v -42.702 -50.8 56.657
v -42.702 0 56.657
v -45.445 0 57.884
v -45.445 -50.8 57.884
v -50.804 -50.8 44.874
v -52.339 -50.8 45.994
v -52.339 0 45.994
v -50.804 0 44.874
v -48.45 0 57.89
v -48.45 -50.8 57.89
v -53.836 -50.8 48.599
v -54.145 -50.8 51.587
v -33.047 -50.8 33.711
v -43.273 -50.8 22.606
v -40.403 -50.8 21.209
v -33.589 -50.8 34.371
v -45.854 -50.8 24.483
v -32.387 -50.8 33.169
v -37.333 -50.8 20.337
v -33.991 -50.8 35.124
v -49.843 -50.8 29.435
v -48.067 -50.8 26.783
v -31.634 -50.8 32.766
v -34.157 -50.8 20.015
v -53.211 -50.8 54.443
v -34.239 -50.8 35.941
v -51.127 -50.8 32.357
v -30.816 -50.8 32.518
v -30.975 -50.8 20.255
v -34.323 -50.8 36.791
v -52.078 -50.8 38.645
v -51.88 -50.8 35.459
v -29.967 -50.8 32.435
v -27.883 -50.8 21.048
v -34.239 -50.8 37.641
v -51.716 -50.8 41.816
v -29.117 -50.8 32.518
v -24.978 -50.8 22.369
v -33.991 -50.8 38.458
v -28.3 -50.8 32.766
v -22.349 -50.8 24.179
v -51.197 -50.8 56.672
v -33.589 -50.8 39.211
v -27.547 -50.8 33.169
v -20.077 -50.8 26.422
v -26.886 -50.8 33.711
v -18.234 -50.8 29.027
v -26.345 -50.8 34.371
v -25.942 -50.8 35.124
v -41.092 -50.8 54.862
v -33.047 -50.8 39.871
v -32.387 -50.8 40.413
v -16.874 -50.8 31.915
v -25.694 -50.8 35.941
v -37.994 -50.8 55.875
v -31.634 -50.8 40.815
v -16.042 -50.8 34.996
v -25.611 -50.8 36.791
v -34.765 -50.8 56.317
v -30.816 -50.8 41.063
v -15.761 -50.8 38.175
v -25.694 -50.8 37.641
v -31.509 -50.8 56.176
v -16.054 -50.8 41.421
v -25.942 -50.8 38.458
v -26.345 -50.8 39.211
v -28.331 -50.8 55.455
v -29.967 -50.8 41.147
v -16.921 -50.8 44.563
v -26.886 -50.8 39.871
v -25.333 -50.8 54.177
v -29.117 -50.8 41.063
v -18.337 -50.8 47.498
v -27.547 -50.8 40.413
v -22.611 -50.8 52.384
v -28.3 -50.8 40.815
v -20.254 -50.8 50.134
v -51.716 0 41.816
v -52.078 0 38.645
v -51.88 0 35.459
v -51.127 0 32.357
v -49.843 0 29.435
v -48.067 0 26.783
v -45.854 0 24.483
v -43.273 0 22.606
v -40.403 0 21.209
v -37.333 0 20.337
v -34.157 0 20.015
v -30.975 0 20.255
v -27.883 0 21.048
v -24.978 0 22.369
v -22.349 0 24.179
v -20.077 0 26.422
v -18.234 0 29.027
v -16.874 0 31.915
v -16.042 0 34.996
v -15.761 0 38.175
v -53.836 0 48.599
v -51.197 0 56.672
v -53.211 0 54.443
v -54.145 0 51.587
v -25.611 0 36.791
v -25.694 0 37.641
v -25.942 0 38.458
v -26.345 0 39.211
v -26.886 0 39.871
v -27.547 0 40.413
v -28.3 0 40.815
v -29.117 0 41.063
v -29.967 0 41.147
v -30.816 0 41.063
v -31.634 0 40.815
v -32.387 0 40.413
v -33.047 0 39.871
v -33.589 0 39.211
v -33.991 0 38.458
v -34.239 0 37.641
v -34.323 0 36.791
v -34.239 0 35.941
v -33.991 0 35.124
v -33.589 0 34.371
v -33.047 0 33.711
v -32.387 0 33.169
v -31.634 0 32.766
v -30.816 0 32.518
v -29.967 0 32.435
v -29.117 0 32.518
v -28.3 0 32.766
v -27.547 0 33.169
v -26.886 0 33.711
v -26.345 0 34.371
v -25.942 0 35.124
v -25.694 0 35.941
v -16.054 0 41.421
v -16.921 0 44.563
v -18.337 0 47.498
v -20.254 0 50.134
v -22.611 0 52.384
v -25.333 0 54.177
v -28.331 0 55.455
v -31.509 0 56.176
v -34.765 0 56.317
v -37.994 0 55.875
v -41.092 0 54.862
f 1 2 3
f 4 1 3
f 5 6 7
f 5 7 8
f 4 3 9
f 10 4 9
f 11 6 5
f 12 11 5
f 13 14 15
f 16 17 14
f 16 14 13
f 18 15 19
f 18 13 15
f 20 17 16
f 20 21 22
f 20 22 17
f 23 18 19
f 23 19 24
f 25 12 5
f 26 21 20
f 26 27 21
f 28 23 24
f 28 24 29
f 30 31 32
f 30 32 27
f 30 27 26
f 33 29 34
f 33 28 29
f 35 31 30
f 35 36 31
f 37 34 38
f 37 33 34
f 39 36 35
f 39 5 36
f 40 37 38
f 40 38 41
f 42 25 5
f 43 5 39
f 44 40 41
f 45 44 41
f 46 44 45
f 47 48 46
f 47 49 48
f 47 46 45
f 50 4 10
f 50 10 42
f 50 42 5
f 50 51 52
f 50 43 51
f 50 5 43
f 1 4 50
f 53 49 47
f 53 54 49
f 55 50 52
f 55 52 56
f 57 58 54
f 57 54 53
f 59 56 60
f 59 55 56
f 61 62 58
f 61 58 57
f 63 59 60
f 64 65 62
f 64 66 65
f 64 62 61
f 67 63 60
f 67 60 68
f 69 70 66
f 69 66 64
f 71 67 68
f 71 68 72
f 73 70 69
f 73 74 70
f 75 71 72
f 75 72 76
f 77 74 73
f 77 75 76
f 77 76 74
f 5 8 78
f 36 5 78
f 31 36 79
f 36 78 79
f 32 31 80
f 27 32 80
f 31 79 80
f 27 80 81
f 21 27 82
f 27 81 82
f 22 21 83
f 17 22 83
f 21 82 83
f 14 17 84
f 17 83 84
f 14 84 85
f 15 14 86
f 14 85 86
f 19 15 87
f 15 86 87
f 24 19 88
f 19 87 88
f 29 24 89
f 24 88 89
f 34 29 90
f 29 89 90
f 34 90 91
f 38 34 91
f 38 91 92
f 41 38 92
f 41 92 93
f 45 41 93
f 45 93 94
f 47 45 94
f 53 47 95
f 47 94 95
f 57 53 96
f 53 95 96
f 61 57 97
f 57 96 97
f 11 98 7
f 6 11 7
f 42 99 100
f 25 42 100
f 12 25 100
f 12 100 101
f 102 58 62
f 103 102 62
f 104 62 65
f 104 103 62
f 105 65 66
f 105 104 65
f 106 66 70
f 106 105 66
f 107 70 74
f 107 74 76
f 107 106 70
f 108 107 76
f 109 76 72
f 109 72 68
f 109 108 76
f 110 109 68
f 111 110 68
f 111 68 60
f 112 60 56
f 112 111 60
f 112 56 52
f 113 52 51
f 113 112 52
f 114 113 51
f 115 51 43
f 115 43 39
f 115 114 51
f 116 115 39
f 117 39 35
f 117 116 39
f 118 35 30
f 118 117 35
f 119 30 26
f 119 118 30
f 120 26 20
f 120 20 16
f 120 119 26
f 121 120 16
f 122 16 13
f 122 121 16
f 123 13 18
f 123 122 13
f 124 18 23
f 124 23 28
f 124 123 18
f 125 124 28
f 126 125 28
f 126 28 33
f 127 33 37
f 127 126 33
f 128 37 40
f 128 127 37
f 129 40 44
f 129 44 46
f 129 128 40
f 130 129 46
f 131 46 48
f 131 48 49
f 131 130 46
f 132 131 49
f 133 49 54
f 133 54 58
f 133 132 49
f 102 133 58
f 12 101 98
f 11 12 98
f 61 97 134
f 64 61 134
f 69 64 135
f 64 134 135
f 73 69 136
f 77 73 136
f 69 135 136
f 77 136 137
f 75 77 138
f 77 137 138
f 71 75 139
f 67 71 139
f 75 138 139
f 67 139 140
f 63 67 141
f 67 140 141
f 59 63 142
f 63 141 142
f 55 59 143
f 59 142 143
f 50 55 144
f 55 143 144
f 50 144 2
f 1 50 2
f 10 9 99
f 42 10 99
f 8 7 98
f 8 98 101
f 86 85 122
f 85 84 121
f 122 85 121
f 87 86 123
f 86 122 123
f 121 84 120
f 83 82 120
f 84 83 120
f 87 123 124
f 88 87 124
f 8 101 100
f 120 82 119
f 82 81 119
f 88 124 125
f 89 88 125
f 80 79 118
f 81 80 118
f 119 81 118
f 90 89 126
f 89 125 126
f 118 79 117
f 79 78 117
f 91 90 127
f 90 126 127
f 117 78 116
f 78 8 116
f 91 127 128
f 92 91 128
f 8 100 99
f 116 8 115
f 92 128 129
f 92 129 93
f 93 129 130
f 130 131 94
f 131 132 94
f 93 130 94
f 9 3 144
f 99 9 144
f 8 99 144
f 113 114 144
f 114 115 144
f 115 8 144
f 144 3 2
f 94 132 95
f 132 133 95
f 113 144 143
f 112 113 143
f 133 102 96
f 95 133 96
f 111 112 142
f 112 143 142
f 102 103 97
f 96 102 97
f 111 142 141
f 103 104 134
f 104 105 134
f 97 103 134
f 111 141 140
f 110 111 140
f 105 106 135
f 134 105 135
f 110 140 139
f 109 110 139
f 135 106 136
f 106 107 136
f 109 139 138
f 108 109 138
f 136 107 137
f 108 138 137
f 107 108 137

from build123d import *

# Parameters (mm, degrees)
F0_R     = 4.3560889736
F1_DEPTH = 50.8


with BuildPart() as f1:
    # F0 (on Front) → F1 (new body)
    with BuildSketch(Plane.XZ):
        with BuildLine():
            ThreePointArc((-50.8035481042, 44.8743139746), (-37.3327925125, 20.3368670349), (-15.7611440911, 38.1753519177))
            ThreePointArc((-15.7611440911, 38.1753519177), (-23.931762198, 53.3418471705), (-41.0919163358, 54.8619420575))
            Line((-41.0919163358, 54.8619420575), (-40.6960048204, 54.4206382187))
            Line((-40.6960048204, 54.4206382187), (-39.7726875247, 51.561406541))
            Line((-39.7726875247, 51.561406541), (-40.0921494975, 48.5738214521))
            Line((-40.0921494975, 48.5738214521), (-41.5991528616, 45.9744635553))
            Line((-41.5991528616, 45.9744635553), (-44.0331230447, 44.2127854453))
            Line((-44.0331230447, 44.2127854453), (-46.97320449, 43.5933972717))
            Line((-46.97320449, 43.5933972717), (-49.9110304061, 44.2233968767))
            Line((-49.9110304061, 44.2233968767), (-50.8035481042, 44.8743139746))
        make_face()
        with Locations((-29.9666635692, 36.7907546461)):
            Circle(F0_R, mode=Mode.SUBTRACT)
        with BuildLine():
            Line((-40.6960048204, 54.4206382187), (-41.0919163358, 54.8619420575))
            ThreePointArc((-41.0919163358, 54.8619420575), (-46.9434332236, 50.8363139975), (-50.8035481042, 44.8743139746))
            Line((-50.8035481042, 44.8743139746), (-49.9110304061, 44.2233968767))
            Line((-49.9110304061, 44.2233968767), (-46.97320449, 43.5933972717))
            Line((-46.97320449, 43.5933972717), (-44.0331230447, 44.2127854453))
            Line((-44.0331230447, 44.2127854453), (-41.5991528616, 45.9744635553))
            Line((-41.5991528616, 45.9744635553), (-40.0921494975, 48.5738214521))
            Line((-40.0921494975, 48.5738214521), (-39.7726875247, 51.561406541))
            Line((-39.7726875247, 51.561406541), (-40.6960048204, 54.4206382187))
        make_face()
        with BuildLine():
            ThreePointArc((-50.8035481042, 44.8743139746), (-46.9434332236, 50.8363139975), (-41.0919163358, 54.8619420575))
            Line((-41.0919163358, 54.8619420575), (-42.7024514363, 56.6571293527))
            Line((-42.7024514363, 56.6571293527), (-45.4450945244, 57.8841703083))
            Line((-45.4450945244, 57.8841703083), (-48.4497061786, 57.8895945568))
            Line((-48.4497061786, 57.8895945568), (-51.1967617479, 56.6724641964))
            Line((-51.1967617479, 56.6724641964), (-53.2112703682, 54.4432321237))
            Line((-53.2112703682, 54.4432321237), (-54.1449051977, 51.587352816))
            Line((-54.1449051977, 51.587352816), (-53.8362322927, 48.5986337504))
            Line((-53.8362322927, 48.5986337504), (-52.3386240026, 45.9938516051))
            Line((-52.3386240026, 45.9938516051), (-50.8035481042, 44.8743139746))
        make_face()
    extrude(amount=F1_DEPTH)


solid = f1.part
